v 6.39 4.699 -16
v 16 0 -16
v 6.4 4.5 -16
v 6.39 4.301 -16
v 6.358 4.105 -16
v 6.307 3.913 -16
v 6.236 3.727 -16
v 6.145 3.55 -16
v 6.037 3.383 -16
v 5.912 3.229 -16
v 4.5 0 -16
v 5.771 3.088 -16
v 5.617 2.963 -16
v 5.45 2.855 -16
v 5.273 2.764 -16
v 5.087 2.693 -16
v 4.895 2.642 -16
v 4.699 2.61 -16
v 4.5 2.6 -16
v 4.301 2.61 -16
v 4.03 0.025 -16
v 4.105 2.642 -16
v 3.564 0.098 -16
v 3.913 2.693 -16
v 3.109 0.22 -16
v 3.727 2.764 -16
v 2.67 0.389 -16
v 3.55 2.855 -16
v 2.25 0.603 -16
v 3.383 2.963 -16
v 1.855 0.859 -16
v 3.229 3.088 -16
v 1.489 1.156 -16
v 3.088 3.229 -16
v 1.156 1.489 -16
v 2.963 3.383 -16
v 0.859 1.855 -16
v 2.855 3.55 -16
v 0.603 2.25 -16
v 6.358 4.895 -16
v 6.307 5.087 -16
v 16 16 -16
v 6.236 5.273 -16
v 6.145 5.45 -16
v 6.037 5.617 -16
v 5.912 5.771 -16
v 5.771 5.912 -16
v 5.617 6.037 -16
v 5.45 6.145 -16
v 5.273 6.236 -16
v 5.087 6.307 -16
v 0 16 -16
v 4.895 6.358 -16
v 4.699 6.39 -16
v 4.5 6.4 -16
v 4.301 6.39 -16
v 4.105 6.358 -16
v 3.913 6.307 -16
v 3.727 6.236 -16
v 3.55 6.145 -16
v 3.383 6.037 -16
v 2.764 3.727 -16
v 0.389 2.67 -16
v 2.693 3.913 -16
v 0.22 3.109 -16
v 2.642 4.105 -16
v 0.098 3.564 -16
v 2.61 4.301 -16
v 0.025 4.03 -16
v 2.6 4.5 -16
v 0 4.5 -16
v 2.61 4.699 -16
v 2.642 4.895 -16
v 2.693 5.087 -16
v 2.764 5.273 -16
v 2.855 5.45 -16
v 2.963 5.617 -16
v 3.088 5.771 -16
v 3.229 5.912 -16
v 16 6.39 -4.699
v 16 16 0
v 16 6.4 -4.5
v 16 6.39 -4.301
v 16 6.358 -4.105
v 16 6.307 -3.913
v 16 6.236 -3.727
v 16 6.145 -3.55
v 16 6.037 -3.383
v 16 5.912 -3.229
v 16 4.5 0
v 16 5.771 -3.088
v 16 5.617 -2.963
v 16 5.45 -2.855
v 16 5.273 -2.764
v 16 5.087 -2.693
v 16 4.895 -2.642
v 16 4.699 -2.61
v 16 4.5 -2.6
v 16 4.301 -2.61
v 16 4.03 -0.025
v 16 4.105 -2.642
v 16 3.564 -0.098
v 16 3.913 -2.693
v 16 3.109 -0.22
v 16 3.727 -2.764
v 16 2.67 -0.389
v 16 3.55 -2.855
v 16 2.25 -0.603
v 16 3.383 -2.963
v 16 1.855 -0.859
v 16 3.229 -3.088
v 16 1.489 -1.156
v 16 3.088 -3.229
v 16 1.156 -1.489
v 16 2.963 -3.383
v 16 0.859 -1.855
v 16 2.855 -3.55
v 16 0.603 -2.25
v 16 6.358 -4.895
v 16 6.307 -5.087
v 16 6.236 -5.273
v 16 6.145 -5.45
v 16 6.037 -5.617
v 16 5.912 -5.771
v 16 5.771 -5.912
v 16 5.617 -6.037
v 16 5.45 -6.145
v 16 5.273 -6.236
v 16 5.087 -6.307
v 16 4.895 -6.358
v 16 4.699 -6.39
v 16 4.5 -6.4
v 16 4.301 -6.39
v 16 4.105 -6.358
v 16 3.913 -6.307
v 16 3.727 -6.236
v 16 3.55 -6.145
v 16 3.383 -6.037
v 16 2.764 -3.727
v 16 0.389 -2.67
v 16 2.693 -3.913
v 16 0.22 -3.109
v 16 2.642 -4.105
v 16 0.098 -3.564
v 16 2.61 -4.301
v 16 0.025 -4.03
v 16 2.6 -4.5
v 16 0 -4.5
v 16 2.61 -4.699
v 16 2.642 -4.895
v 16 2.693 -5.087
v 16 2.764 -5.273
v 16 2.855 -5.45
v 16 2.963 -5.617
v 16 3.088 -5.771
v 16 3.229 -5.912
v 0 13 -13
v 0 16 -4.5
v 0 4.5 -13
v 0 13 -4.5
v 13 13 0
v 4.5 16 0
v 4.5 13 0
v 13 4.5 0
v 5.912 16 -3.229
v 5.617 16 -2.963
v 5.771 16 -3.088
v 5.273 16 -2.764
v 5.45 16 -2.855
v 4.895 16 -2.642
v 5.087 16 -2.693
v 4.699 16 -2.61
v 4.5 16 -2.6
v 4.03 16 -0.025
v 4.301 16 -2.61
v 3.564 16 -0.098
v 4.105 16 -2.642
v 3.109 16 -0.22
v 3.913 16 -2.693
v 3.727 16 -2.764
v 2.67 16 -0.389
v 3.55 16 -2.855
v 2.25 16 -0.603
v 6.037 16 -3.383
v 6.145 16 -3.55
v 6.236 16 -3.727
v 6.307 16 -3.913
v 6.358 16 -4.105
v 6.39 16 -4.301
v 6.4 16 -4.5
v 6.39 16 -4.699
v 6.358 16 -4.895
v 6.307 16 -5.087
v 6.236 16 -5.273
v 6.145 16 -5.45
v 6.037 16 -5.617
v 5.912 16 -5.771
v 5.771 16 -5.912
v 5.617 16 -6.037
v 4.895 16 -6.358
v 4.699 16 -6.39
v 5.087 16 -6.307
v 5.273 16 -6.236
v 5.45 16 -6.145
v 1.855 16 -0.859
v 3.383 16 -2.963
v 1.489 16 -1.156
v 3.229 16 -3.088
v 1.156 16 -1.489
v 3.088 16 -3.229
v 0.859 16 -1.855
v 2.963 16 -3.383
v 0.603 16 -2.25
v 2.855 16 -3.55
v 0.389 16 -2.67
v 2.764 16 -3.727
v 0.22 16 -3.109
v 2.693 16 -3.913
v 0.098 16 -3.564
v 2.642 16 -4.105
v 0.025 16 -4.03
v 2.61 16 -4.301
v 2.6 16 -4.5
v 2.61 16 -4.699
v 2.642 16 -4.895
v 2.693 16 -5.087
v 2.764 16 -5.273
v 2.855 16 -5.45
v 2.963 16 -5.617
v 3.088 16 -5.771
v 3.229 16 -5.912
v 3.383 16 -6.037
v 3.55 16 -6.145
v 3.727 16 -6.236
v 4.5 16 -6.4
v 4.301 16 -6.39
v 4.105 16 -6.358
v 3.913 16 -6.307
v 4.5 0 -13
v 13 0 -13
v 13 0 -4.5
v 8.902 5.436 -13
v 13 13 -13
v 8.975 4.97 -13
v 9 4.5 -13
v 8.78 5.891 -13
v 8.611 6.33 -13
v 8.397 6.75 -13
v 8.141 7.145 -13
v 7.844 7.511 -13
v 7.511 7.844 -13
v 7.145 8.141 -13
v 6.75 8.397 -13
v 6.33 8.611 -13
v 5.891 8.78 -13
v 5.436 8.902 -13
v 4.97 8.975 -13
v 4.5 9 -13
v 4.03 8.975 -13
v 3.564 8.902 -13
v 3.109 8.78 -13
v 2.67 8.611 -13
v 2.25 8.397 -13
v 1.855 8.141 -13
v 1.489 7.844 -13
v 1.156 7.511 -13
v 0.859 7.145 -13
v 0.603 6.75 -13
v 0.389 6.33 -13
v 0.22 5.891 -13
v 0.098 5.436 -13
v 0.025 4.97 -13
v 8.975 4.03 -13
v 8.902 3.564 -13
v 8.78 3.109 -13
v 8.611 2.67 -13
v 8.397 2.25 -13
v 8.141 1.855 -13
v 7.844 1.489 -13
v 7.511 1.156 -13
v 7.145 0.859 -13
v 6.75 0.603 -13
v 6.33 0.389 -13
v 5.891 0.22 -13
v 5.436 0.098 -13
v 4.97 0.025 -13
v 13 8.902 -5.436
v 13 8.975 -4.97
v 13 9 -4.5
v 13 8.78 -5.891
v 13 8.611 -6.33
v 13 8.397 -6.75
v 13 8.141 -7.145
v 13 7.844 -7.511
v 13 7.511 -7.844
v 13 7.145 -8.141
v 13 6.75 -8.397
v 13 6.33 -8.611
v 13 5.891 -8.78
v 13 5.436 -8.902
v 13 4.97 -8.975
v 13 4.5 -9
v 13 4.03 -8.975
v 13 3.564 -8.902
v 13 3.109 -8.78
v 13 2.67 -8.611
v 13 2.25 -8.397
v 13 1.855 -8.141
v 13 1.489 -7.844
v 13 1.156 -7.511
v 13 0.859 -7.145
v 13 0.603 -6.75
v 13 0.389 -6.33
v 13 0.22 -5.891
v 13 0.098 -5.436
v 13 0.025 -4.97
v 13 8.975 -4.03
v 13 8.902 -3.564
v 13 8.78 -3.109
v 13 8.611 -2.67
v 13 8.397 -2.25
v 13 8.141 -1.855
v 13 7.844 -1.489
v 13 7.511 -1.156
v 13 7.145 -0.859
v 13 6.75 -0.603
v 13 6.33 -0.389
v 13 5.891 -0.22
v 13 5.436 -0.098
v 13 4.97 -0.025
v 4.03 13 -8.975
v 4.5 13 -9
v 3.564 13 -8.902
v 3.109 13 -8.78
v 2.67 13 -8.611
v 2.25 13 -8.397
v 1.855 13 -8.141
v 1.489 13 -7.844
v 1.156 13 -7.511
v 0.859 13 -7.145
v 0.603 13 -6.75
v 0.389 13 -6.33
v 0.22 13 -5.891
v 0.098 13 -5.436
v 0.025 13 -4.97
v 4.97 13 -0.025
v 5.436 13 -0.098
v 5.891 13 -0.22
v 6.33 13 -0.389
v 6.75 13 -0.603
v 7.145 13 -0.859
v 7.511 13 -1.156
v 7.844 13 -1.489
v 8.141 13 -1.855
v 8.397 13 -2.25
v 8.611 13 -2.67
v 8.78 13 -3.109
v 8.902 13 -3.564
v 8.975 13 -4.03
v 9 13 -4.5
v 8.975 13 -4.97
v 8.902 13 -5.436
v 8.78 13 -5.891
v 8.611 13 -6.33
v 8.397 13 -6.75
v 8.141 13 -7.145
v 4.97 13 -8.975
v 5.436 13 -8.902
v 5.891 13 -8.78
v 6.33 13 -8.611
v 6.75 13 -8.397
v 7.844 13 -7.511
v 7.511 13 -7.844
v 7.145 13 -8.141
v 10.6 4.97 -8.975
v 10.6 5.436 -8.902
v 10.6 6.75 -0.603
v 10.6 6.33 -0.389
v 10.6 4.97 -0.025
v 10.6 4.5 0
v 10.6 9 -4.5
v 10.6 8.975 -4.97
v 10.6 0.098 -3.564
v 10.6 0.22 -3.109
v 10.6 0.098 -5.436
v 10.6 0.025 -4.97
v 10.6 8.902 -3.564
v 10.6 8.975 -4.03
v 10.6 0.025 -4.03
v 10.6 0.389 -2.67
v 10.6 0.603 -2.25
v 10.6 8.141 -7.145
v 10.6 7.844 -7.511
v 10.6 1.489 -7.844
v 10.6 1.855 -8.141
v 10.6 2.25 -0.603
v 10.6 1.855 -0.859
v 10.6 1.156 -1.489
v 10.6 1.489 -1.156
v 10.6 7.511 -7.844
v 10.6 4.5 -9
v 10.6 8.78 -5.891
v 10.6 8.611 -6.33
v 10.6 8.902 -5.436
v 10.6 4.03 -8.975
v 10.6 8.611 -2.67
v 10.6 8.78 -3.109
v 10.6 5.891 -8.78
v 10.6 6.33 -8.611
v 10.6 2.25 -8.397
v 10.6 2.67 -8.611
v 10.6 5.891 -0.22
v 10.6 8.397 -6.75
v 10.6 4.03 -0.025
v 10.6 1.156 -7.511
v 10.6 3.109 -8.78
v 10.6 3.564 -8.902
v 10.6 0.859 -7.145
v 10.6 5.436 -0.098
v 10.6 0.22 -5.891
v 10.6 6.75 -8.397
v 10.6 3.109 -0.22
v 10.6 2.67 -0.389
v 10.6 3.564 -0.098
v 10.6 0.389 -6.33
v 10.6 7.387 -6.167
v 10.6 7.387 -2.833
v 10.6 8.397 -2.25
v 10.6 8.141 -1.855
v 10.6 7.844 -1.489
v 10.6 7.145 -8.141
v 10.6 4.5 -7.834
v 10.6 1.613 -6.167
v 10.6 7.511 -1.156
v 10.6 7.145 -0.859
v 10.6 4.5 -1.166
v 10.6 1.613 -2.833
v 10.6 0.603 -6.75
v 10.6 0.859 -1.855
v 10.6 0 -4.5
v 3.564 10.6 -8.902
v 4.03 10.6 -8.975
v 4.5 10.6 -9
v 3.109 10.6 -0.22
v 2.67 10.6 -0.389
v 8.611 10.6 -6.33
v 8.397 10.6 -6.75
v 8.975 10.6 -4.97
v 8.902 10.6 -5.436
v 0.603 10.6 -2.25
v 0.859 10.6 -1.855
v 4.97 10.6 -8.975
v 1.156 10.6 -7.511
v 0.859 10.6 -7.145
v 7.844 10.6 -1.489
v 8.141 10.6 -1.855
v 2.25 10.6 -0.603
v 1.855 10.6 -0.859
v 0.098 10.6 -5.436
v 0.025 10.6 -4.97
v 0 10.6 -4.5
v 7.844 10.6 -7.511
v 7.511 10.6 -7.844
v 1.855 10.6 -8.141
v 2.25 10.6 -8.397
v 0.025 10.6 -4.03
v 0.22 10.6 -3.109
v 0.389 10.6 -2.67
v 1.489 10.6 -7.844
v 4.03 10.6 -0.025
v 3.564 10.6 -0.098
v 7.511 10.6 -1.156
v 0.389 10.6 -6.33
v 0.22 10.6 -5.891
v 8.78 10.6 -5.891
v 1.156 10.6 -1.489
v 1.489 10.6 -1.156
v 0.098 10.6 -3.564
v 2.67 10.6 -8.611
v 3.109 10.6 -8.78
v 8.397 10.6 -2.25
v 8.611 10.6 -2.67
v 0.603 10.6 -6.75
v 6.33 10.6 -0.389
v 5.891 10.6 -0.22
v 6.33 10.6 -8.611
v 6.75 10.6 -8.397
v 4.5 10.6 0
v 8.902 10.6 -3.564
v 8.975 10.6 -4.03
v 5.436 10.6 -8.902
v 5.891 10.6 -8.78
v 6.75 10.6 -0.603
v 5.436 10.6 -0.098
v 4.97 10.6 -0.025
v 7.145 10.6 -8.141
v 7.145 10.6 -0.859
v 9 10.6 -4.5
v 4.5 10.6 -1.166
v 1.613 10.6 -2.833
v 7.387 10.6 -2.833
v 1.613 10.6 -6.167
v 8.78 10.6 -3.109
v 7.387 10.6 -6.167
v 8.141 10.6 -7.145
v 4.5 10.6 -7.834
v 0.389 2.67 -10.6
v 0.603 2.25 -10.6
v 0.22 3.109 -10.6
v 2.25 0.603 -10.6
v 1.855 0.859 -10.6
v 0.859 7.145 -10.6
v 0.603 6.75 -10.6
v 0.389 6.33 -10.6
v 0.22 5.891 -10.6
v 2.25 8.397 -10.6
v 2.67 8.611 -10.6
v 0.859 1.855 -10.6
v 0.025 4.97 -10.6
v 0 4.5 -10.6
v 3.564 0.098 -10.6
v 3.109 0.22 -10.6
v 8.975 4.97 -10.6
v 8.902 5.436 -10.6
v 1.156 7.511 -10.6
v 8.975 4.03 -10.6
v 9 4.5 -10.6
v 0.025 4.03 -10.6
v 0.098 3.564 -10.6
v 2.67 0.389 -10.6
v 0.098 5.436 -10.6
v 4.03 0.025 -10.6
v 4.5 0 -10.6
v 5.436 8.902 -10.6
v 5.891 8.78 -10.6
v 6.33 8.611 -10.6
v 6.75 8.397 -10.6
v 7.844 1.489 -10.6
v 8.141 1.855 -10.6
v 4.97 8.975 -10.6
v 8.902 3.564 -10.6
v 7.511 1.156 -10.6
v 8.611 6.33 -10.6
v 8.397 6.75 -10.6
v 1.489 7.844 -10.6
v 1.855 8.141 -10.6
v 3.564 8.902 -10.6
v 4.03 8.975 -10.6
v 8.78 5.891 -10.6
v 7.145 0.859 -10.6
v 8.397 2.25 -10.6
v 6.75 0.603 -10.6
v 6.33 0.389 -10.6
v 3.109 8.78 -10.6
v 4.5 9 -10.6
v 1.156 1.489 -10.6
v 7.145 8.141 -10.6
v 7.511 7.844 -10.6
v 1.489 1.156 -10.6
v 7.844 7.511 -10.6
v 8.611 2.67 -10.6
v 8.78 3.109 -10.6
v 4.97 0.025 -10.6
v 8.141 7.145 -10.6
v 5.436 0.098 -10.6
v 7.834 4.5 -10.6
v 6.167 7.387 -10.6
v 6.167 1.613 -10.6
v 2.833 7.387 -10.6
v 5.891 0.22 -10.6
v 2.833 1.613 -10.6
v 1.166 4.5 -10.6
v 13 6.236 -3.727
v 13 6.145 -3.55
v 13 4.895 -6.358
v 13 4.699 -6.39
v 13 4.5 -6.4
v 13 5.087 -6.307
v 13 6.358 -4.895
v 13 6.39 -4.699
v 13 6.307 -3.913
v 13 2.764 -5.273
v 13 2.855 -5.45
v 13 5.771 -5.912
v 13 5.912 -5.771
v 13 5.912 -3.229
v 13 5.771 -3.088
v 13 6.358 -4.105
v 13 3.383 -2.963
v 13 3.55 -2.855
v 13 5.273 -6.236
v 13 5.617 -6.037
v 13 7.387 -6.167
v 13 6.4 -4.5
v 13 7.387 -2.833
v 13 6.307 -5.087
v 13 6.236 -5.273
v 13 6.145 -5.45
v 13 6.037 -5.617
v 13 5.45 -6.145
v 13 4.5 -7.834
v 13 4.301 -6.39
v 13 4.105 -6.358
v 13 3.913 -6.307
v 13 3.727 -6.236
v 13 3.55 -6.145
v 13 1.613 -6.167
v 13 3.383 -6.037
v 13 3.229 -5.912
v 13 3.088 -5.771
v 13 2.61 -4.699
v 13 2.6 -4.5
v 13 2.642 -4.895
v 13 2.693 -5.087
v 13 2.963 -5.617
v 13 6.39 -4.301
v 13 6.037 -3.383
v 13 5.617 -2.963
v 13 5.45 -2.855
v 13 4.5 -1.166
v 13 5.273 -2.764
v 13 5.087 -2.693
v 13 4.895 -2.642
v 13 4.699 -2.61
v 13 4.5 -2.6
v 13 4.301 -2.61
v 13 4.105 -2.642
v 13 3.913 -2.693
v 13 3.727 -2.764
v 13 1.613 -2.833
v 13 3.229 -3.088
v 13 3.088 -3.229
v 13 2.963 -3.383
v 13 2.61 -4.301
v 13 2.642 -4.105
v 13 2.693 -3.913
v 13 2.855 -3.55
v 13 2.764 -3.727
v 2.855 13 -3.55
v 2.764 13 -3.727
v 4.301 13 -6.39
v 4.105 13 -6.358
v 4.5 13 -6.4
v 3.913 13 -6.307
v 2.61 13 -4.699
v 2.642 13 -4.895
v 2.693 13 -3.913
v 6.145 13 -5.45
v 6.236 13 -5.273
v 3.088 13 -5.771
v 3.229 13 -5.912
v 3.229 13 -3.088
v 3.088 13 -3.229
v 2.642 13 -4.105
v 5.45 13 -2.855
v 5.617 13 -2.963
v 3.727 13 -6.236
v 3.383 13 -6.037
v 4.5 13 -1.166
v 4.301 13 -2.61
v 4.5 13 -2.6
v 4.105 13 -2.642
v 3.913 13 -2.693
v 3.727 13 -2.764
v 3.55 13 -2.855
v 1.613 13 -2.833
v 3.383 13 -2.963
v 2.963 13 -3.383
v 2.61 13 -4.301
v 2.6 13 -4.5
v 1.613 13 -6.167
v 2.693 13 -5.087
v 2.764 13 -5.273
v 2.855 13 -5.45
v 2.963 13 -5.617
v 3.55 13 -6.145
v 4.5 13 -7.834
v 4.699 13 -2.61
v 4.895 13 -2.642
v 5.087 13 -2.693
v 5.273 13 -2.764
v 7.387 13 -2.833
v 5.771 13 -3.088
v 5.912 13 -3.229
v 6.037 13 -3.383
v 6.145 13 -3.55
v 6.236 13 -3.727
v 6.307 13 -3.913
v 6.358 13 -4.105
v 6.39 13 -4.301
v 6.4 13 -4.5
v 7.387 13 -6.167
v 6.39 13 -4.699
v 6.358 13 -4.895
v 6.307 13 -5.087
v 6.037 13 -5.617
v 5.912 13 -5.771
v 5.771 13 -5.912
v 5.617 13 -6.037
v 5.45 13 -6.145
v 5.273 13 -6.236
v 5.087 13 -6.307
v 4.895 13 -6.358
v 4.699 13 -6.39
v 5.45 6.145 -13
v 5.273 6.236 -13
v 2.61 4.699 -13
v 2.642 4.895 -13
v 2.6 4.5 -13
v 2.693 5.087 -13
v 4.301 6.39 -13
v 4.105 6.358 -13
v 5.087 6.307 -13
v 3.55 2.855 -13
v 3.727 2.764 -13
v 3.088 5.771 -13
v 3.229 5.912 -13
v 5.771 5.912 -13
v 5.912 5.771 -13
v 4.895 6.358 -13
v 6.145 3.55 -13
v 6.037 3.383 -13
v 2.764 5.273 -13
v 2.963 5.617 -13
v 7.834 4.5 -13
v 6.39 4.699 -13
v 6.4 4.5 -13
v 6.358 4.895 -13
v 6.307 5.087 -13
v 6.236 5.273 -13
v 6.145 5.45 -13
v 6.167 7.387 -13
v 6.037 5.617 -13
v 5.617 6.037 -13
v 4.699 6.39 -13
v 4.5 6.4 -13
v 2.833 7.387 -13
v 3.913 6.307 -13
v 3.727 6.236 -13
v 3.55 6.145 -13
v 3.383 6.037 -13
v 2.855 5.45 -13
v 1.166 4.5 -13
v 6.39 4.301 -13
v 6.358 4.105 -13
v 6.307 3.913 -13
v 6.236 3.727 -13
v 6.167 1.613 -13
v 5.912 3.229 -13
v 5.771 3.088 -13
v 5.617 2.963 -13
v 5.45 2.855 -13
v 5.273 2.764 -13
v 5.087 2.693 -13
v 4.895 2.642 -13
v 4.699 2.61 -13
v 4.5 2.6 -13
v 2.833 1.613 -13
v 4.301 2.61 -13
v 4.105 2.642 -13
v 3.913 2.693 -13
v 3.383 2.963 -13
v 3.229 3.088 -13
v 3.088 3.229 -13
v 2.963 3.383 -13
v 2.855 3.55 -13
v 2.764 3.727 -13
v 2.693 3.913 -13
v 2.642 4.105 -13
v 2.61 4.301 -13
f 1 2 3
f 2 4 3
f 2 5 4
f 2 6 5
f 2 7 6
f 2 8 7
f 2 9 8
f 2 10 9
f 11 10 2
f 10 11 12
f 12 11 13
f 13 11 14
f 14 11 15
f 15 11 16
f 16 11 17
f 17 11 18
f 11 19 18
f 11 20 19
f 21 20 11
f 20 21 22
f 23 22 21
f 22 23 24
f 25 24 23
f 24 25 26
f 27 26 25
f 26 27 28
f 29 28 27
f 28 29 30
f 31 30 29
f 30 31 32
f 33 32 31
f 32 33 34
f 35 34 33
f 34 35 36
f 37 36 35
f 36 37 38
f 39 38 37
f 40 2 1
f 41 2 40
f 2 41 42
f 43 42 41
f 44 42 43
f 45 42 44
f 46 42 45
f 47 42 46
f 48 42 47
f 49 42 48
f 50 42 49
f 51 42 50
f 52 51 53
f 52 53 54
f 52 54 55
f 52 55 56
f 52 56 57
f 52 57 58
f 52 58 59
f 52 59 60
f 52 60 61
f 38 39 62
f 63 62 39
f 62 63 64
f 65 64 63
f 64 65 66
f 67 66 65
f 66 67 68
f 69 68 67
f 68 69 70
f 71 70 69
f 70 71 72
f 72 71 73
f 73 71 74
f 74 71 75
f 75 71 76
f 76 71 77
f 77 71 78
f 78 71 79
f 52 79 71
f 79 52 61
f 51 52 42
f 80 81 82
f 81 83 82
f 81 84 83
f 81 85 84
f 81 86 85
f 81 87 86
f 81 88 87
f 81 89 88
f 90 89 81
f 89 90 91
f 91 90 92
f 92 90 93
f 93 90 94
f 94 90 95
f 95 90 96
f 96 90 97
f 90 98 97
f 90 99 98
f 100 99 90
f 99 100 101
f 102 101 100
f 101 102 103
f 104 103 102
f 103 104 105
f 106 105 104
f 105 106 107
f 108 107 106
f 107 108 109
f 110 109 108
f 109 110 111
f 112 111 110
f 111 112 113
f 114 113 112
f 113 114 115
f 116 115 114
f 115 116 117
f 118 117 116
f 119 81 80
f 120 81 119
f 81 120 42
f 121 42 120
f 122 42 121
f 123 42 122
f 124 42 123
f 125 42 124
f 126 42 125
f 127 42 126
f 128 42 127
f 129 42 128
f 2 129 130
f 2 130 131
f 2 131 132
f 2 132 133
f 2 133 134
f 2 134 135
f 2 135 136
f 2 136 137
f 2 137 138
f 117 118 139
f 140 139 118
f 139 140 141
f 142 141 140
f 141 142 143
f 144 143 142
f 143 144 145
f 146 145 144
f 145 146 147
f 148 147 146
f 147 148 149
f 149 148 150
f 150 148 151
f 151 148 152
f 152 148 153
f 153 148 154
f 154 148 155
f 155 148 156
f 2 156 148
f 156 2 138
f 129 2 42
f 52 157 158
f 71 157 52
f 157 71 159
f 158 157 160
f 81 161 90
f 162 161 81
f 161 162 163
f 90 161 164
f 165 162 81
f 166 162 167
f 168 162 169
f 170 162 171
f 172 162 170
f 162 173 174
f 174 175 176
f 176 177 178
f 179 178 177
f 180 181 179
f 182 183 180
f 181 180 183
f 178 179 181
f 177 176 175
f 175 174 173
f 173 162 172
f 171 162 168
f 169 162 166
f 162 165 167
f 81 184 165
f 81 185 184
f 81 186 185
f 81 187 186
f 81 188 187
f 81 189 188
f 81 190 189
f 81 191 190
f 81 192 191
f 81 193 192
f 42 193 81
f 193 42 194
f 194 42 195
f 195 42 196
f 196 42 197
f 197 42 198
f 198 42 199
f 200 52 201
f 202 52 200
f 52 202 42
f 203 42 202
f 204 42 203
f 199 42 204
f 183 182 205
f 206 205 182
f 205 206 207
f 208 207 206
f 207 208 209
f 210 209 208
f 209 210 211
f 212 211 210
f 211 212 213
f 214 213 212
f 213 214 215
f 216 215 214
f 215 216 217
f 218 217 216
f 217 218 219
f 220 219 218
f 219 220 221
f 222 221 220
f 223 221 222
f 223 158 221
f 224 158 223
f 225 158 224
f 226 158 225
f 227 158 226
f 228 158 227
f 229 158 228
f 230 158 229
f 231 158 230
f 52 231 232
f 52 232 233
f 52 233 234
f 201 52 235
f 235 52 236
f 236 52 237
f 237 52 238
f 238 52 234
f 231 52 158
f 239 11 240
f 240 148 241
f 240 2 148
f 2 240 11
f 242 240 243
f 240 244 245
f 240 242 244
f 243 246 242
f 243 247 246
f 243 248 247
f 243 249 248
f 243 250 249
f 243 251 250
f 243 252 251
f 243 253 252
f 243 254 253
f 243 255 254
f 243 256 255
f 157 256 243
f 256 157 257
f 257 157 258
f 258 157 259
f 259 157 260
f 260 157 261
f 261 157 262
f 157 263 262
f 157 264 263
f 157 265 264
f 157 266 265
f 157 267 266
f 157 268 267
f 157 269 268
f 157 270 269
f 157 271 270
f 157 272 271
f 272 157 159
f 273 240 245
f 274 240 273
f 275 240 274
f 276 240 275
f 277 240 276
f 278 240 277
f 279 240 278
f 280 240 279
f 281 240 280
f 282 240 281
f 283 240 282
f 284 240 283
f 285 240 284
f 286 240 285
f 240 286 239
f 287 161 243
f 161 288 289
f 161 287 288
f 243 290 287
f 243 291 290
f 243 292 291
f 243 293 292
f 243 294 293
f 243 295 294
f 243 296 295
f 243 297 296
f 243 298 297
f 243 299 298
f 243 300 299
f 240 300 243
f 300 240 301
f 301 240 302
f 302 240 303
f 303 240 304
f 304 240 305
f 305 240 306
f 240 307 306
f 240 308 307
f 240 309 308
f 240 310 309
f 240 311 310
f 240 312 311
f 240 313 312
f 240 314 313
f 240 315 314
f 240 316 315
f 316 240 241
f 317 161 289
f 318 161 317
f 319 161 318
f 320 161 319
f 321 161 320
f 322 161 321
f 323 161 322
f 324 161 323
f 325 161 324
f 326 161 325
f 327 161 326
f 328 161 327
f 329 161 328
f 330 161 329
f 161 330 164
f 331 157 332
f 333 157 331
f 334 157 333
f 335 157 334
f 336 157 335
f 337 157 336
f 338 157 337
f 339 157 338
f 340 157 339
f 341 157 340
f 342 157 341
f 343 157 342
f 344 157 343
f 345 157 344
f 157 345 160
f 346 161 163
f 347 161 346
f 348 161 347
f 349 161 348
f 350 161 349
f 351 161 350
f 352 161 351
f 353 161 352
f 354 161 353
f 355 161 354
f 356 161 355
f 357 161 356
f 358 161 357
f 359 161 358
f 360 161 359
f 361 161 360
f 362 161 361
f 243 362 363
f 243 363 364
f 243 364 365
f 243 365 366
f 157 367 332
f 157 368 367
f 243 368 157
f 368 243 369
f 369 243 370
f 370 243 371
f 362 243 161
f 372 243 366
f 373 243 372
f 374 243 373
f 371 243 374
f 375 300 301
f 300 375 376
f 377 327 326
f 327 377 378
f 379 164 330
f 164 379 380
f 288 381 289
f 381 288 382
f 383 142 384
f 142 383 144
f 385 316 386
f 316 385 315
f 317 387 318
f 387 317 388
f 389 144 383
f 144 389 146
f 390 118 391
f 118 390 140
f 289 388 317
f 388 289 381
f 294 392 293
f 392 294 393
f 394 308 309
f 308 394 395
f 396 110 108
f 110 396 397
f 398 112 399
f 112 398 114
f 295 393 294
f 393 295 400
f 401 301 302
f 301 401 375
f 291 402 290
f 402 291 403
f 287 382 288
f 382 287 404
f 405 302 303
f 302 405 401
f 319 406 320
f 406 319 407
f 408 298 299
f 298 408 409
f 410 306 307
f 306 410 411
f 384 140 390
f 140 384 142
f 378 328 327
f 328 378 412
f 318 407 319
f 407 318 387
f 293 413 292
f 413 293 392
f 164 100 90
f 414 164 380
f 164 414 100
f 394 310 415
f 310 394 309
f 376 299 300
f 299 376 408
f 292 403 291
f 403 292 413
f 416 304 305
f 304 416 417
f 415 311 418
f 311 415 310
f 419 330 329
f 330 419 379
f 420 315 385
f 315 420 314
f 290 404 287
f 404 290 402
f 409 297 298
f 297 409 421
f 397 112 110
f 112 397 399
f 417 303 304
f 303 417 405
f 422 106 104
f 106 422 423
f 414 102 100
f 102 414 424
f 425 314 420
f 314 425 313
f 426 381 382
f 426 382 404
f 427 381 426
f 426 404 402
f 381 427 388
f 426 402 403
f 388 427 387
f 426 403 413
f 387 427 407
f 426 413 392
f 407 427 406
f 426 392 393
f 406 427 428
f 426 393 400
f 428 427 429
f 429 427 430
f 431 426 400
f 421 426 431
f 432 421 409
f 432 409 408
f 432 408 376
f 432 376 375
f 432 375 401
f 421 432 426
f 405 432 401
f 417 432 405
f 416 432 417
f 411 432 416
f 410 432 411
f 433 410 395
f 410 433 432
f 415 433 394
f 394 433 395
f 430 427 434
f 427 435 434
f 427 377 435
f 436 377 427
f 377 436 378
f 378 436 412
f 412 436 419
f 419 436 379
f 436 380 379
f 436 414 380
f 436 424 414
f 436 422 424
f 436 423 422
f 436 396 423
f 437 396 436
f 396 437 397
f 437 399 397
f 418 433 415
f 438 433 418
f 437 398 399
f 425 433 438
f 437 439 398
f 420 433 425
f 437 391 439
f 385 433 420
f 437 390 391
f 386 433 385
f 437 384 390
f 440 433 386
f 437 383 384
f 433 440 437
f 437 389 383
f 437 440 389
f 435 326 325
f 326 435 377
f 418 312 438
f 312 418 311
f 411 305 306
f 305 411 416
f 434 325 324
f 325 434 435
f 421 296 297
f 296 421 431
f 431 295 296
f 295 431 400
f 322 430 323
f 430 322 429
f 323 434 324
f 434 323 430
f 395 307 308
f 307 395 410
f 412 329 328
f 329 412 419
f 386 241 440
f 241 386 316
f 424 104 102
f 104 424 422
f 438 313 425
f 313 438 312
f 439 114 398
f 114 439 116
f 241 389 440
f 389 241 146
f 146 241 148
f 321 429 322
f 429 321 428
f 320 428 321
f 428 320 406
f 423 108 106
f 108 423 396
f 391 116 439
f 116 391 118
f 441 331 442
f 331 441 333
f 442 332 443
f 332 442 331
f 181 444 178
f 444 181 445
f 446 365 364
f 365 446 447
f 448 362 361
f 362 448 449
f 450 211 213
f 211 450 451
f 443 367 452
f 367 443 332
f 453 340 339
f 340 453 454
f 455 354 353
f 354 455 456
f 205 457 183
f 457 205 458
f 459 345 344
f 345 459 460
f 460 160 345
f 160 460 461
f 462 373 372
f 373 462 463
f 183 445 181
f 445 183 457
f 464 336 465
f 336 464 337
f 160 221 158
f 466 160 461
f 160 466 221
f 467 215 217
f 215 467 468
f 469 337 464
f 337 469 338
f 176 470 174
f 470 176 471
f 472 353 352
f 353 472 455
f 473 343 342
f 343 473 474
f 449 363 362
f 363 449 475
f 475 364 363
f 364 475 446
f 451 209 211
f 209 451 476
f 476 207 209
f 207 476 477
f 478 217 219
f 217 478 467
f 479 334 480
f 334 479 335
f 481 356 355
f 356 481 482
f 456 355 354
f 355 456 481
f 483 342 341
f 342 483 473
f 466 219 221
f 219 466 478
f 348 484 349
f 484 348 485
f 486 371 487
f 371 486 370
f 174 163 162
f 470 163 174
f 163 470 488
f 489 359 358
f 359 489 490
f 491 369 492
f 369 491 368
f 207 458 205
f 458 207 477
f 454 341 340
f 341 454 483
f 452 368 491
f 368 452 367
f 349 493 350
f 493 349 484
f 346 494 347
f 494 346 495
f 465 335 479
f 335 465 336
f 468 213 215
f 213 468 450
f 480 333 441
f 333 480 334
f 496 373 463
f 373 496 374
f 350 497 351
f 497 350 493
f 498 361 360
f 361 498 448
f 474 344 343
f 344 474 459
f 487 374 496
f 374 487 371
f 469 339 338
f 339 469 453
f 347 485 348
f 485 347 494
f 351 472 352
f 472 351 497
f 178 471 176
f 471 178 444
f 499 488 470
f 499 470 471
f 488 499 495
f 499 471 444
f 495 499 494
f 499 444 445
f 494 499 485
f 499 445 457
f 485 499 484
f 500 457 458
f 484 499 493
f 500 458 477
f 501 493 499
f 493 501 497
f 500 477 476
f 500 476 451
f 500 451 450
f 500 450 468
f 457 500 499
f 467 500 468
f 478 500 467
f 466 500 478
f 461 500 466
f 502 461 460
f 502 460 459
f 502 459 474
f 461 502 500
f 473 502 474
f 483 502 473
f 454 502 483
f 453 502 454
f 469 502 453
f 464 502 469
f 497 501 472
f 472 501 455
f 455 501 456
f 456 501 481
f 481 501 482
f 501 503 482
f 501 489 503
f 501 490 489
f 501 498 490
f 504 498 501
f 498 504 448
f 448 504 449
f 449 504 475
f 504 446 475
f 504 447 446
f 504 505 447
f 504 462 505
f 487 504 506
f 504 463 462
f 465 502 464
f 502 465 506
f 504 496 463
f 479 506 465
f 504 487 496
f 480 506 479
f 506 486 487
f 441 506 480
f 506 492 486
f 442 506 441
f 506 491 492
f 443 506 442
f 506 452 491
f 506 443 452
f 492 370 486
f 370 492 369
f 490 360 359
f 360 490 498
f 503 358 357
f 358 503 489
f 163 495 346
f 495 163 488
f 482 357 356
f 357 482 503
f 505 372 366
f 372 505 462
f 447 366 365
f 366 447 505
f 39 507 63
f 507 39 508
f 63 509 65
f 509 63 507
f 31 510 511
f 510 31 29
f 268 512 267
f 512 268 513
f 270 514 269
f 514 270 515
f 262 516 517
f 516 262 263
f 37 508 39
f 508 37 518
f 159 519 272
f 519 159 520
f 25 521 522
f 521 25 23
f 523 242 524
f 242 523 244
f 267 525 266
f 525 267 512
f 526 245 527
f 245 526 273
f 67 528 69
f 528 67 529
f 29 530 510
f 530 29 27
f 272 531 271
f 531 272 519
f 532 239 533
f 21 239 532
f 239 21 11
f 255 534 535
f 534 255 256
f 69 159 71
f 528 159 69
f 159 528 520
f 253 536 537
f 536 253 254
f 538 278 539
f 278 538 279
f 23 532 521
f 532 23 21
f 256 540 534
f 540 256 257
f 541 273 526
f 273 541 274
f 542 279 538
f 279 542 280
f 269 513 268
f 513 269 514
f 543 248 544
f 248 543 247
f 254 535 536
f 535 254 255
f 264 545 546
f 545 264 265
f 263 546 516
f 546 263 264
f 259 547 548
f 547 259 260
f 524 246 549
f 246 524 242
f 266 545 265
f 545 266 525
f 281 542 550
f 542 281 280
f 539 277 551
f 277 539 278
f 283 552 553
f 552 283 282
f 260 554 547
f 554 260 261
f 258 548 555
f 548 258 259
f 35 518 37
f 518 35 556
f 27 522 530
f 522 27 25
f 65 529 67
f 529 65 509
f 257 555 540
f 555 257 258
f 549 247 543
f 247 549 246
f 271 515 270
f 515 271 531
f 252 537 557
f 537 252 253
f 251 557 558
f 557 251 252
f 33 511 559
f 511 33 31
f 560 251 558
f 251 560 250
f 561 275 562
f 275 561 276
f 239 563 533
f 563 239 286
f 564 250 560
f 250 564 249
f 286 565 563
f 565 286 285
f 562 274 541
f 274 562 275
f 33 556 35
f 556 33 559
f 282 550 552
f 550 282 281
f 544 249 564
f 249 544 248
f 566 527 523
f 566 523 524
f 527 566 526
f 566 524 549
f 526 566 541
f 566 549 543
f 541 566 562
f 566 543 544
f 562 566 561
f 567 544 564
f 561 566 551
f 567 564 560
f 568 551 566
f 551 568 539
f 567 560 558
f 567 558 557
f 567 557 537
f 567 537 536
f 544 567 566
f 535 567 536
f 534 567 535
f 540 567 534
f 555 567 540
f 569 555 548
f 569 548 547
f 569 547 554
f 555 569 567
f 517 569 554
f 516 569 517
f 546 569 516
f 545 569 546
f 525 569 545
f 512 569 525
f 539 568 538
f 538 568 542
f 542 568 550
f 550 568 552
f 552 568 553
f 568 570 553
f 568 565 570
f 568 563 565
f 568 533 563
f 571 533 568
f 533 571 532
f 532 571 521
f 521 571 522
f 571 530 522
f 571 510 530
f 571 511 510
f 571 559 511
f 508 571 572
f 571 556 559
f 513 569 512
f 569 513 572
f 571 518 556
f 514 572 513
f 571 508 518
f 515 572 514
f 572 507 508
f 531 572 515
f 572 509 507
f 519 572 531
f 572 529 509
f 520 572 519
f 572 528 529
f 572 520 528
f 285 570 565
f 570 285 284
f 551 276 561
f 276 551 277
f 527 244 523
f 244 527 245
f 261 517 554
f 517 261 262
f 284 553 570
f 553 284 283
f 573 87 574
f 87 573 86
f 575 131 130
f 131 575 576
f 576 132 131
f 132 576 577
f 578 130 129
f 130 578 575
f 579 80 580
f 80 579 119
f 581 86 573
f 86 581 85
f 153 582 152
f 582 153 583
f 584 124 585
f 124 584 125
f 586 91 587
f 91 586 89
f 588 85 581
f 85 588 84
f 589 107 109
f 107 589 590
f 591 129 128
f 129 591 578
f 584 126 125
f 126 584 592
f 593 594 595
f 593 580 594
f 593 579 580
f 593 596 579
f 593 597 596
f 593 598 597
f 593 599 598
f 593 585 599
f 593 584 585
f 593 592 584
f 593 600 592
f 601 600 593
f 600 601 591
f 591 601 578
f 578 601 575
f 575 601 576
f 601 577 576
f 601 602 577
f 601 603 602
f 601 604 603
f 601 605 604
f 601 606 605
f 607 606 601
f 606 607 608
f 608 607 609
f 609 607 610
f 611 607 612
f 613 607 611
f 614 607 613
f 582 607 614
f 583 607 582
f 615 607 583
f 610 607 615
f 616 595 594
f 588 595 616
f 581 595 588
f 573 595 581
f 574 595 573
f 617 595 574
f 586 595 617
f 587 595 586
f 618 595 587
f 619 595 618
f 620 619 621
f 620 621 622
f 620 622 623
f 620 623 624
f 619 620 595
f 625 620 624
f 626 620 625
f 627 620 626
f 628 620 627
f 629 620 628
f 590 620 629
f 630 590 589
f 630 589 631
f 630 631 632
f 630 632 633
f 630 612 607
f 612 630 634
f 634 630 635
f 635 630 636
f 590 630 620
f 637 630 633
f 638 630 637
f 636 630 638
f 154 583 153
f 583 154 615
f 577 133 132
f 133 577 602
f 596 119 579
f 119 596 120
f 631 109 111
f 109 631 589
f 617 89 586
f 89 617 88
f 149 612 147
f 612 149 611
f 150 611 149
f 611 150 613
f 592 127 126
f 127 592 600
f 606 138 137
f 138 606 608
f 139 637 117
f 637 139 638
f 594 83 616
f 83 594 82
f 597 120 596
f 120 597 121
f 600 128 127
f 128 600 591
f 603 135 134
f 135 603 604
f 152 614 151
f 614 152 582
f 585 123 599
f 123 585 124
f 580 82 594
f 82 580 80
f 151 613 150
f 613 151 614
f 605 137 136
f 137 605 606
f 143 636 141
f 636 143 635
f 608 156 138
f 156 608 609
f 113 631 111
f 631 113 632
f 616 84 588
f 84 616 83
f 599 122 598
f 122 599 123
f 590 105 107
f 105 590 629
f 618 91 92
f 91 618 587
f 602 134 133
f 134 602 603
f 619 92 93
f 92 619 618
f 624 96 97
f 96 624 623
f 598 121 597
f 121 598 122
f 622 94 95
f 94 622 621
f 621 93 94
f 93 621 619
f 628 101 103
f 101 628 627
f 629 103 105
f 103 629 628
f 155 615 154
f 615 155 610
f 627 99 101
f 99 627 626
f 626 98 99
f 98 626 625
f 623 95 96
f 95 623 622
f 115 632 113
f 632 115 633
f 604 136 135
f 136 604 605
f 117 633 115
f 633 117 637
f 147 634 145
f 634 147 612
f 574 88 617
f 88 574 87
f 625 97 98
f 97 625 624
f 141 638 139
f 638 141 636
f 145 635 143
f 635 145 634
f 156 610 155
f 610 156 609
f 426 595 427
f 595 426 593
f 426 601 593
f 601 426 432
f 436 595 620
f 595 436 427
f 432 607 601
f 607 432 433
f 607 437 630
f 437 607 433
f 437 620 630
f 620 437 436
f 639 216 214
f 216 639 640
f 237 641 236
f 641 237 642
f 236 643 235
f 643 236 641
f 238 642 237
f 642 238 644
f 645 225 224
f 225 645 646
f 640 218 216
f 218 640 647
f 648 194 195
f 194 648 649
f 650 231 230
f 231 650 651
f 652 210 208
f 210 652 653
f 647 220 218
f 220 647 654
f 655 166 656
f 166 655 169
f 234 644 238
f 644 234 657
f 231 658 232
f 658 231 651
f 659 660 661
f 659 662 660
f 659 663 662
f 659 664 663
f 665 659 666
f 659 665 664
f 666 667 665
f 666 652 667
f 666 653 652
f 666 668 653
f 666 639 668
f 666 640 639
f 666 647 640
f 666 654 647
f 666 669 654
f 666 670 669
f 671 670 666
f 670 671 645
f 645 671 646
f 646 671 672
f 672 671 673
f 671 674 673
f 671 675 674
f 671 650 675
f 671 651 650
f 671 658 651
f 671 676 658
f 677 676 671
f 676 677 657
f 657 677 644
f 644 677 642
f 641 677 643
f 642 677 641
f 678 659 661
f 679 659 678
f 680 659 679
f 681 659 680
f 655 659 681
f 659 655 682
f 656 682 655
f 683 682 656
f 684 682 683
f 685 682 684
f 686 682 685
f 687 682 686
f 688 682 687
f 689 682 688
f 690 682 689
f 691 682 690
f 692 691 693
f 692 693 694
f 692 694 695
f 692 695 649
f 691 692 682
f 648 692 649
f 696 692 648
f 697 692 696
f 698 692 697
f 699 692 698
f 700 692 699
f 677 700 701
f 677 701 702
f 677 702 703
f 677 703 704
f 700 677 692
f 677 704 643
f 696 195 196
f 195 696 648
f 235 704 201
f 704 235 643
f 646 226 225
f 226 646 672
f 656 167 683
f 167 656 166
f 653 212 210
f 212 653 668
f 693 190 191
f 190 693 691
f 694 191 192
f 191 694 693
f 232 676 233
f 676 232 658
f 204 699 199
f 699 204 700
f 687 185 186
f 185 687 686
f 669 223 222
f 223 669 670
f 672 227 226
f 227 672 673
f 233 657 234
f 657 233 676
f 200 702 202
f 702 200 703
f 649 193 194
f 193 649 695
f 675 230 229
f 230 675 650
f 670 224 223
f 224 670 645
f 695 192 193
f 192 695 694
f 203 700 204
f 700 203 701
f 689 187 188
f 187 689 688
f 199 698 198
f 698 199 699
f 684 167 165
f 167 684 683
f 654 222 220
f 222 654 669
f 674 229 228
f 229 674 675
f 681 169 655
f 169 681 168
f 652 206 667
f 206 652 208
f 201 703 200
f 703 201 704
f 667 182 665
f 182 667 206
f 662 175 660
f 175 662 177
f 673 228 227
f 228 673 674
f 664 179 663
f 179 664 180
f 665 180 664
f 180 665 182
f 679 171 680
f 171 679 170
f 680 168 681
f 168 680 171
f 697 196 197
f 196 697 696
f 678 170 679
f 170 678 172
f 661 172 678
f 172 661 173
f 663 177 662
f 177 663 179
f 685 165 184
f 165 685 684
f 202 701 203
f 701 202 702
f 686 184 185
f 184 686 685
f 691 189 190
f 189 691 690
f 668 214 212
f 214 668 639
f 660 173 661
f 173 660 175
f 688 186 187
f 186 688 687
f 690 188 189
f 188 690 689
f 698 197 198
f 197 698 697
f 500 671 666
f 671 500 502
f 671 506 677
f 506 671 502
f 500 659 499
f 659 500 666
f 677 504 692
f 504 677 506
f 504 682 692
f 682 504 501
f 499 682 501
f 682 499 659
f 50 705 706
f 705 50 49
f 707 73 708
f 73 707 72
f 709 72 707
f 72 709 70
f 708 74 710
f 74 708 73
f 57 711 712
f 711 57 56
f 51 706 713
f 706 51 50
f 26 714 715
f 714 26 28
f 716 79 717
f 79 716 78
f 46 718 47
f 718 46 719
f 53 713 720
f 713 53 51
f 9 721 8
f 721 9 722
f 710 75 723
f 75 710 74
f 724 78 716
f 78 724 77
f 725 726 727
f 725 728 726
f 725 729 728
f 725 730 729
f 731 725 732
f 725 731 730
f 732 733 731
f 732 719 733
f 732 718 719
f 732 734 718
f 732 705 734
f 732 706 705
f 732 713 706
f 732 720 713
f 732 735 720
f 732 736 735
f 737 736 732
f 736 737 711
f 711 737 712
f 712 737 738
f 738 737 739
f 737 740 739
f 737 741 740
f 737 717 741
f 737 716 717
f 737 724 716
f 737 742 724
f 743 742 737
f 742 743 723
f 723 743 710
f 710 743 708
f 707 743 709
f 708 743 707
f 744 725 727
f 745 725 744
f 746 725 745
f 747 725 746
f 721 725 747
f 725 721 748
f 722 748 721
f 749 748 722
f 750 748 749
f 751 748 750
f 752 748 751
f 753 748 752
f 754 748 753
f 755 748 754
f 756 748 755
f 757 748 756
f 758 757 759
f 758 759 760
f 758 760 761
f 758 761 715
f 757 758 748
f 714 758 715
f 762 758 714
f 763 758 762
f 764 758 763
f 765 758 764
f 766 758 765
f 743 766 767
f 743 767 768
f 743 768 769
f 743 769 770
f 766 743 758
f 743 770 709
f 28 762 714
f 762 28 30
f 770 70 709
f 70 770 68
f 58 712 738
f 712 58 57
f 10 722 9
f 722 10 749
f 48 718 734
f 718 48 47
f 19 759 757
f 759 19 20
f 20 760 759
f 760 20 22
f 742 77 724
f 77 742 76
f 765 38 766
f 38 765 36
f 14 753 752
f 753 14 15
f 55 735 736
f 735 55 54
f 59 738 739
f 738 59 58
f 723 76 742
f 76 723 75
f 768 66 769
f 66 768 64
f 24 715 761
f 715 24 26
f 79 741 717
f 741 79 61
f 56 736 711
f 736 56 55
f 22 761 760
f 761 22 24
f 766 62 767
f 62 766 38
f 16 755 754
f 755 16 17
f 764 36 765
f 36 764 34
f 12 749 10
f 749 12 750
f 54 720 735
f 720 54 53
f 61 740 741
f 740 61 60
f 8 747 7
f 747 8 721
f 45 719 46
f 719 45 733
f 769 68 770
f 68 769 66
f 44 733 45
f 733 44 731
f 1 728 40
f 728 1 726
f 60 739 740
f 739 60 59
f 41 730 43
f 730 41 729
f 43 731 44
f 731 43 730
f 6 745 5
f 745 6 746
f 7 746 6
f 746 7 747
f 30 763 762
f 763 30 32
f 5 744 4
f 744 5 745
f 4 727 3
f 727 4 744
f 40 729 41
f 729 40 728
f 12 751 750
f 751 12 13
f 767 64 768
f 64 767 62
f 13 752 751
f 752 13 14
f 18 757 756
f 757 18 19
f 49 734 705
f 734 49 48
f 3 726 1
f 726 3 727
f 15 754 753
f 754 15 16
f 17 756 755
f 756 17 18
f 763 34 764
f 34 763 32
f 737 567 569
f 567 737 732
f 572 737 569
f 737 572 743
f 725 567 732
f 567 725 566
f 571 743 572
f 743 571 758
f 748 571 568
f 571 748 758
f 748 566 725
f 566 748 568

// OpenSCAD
$fn = 60;
thickness = 3;
size = 16;

hole = 1.9;
reinf = 4.5;

nutThickness = 2.4;

dist = reinf;

rotate([0,90,0])
difference() { 
    foo();    
    translate([dist,dist,size-thickness]) bore();
    translate([dist,size-thickness,dist]) rotate([-90,0,0]) bore();
    translate([size-thickness,dist,dist]) rotate([0,90,0]) bore();
}

module foo() {    
    difference() {
        cube([size,size,size]);
        cube([size-thickness, size-thickness, size-thickness]);
        translate([size - thickness,0,0]) cube([thickness + 1,reinf,reinf]);
        rotate([90,0,90]) translate([size - thickness,0,0]) cube([thickness + 1,reinf,reinf]);
        rotate([-90,-90,0]) translate([size - thickness,0,0]) cube([thickness + 1,reinf,reinf]);
    }    
    boreReinforce();
}

module boreReinforce() {
    g = size - thickness - nutThickness;
    translate([dist, dist, g]) cylinder(thickness+nutThickness, reinf, reinf);
    translate([dist, g, dist]) rotate([-90,0,0]) cylinder(thickness + nutThickness, reinf, reinf);
    translate([g, dist, dist]) rotate([0,90,0]) cylinder(thickness + nutThickness, reinf, reinf);
}

module bore() {
    cylinder(thickness, hole, hole);
    translate([0, 0, -nutThickness-0.3])
    linear_extrude(height = nutThickness + 0.3) scale([1.05,1.05,1.05]) polygon([
        [3.17543,0],
        [1.58771,-2.75],
        [-1.58771,-2.75],
        [-3.17543,0],
        [-1.58771,2.75],
        [1.58771,2.75]
    ]);
}
